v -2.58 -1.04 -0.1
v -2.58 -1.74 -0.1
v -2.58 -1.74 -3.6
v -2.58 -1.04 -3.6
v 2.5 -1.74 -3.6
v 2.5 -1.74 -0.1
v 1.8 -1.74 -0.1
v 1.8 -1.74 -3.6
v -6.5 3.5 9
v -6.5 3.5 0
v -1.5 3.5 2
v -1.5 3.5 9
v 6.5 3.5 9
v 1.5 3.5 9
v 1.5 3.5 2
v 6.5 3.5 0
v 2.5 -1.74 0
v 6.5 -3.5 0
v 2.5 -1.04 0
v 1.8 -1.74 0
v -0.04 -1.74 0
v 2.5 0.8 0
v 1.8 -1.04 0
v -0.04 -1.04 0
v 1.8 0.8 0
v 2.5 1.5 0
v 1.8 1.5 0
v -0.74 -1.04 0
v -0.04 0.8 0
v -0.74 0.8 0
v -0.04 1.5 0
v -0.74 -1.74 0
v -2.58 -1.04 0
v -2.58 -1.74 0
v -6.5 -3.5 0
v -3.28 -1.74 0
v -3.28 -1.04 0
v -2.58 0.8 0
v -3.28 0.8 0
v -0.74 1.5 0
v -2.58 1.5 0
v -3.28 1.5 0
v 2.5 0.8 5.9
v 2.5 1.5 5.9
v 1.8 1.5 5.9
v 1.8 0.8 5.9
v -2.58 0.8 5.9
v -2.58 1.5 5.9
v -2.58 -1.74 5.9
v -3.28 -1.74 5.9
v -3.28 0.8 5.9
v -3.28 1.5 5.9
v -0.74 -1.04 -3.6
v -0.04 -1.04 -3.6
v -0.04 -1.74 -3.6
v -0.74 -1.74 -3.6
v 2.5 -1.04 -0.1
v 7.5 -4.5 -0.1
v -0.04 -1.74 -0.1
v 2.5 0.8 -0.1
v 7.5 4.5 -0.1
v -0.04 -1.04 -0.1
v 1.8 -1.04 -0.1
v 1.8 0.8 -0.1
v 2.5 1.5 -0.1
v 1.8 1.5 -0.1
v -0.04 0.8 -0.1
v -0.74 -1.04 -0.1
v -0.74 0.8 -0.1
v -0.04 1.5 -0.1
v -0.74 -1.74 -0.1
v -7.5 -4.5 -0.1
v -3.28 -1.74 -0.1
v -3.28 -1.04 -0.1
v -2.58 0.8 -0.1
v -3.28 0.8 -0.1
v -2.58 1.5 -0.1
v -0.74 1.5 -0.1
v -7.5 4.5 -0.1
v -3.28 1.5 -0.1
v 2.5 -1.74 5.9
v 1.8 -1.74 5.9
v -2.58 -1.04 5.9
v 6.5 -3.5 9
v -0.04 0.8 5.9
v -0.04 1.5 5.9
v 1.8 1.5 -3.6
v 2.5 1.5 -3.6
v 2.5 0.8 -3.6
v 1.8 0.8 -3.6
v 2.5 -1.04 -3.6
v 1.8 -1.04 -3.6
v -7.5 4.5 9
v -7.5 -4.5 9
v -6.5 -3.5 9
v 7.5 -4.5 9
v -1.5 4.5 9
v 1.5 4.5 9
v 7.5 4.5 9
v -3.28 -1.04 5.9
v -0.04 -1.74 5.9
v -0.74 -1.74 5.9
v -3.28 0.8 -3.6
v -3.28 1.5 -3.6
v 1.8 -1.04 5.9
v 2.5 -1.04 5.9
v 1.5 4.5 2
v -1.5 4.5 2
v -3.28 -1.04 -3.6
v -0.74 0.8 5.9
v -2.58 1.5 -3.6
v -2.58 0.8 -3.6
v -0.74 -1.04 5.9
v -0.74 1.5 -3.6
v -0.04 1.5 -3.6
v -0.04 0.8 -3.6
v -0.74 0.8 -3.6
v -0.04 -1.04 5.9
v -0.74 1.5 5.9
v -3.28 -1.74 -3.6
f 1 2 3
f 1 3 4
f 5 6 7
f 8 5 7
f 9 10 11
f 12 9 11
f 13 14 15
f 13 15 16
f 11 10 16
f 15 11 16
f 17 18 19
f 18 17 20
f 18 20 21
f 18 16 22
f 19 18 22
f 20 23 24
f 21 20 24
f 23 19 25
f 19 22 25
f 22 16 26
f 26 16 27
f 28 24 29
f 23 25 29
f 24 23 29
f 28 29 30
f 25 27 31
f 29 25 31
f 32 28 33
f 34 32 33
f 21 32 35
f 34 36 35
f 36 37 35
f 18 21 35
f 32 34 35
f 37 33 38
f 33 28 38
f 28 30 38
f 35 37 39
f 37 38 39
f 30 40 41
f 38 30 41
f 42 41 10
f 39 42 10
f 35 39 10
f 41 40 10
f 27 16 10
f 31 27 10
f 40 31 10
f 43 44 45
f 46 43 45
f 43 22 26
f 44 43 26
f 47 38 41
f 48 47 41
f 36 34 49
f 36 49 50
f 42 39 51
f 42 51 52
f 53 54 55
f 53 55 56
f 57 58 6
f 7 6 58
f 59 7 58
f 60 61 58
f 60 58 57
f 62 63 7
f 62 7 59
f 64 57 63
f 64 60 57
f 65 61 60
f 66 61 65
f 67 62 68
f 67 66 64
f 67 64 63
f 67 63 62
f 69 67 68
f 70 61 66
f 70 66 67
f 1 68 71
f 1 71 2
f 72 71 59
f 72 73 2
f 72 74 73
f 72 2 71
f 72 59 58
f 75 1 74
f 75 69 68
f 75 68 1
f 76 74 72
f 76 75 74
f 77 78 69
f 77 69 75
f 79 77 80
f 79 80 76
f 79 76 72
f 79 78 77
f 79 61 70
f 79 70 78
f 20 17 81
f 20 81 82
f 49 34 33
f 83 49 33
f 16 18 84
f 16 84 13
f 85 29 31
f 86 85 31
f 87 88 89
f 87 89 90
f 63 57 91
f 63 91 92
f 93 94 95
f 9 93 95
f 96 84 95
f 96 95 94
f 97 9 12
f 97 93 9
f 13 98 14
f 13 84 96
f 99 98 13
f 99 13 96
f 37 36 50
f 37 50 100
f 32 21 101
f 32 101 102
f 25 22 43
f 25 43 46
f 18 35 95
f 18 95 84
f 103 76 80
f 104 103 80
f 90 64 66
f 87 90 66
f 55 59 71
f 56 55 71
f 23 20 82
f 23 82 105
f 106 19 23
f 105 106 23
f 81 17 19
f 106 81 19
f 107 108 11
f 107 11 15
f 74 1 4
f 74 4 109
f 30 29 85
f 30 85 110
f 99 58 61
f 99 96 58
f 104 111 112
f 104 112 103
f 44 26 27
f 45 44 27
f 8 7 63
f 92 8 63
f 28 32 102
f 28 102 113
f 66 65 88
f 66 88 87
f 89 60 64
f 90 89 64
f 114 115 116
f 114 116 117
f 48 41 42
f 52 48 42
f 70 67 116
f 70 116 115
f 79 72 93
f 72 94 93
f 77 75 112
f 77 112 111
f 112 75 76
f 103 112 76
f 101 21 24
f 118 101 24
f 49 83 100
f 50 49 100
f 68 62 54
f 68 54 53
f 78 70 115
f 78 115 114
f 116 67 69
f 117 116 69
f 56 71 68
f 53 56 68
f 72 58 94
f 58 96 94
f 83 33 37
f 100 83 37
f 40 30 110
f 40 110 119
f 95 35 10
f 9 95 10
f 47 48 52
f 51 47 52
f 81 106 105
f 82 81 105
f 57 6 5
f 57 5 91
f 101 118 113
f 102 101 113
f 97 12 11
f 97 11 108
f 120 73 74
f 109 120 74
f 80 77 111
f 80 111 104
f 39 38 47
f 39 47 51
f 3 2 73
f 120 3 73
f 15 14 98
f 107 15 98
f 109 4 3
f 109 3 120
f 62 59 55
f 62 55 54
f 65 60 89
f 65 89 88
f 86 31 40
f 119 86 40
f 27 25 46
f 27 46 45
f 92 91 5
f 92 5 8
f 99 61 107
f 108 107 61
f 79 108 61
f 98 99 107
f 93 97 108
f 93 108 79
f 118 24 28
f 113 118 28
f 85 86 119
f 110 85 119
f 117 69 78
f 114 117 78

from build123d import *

# Parameters (mm, degrees)
CROQUIS1_W                   = 15
CROQUIS1_H                   = 9
CROQUIS1_W_2                 = 13
CROQUIS1_H_2                 = 7
SALIENTE_EXTRUIR1_DEPTH      = 9
CROQUIS2_W                   = 15
CROQUIS2_H                   = 9
SALIENTE_EXTRUIR2_DEPTH      = 0.1
CROQUIS3_W                   = 3
CROQUIS3_H                   = 3.407555274
CORTAR_EXTRUIR1_DEPTH        = 7
CROQUIS4_W                   = 0.7
CROQUIS4_H                   = 0.7
SALIENTE_EXTRUIR3_DEPTH      = 3.5
SALIENTE_EXTRUIR3_DEPTH_BACK = 6


with BuildPart() as part:
    # Croquis1 → Saliente-Extruir1 (new body)
    with BuildSketch(Plane.XY):
        Rectangle(CROQUIS1_W, CROQUIS1_H)
        Rectangle(CROQUIS1_W_2, CROQUIS1_H_2, mode=Mode.SUBTRACT)
    extrude(amount=SALIENTE_EXTRUIR1_DEPTH)

    # Croquis2 → Saliente-Extruir2 (add)
    with BuildSketch(Plane(origin=(0, 0, 0), x_dir=(-1, 0, 0), z_dir=(0, 0, -1))):
        Rectangle(CROQUIS2_W, CROQUIS2_H)
    extrude(amount=SALIENTE_EXTRUIR2_DEPTH)

    # Croquis3 → Cortar-Extruir1 (cut)
    with BuildSketch(Plane.XY.offset(9)):
        with Locations((0, 3.5)):
            Rectangle(CROQUIS3_W, CROQUIS3_H)
    extrude(amount=-CORTAR_EXTRUIR1_DEPTH, mode=Mode.SUBTRACT)

    # Croquis4 → Saliente-Extruir3 (add, two sides)
    with BuildSketch(Plane(origin=(0, 0, -0.1), x_dir=(-1, 0, 0), z_dir=(0, 0, -1))) as saliente_extruir3_sk:
        with Locations((-2.15, 1.15)):
            Rectangle(CROQUIS4_W, CROQUIS4_H)
        with Locations((0.39, 1.15)):
            Rectangle(CROQUIS4_W, CROQUIS4_H)
        with Locations((2.93, 1.15)):
            Rectangle(CROQUIS4_W, CROQUIS4_H)
        with Locations((0.39, -1.39)):
            Rectangle(CROQUIS4_W, CROQUIS4_H)
        with Locations((2.93, -1.39)):
            Rectangle(CROQUIS4_W, CROQUIS4_H)
        with Locations((-2.15, -1.39)):
            Rectangle(CROQUIS4_W, CROQUIS4_H)
    extrude(amount=SALIENTE_EXTRUIR3_DEPTH)
    extrude(saliente_extruir3_sk.sketch, amount=-SALIENTE_EXTRUIR3_DEPTH_BACK)


solid = part.part
